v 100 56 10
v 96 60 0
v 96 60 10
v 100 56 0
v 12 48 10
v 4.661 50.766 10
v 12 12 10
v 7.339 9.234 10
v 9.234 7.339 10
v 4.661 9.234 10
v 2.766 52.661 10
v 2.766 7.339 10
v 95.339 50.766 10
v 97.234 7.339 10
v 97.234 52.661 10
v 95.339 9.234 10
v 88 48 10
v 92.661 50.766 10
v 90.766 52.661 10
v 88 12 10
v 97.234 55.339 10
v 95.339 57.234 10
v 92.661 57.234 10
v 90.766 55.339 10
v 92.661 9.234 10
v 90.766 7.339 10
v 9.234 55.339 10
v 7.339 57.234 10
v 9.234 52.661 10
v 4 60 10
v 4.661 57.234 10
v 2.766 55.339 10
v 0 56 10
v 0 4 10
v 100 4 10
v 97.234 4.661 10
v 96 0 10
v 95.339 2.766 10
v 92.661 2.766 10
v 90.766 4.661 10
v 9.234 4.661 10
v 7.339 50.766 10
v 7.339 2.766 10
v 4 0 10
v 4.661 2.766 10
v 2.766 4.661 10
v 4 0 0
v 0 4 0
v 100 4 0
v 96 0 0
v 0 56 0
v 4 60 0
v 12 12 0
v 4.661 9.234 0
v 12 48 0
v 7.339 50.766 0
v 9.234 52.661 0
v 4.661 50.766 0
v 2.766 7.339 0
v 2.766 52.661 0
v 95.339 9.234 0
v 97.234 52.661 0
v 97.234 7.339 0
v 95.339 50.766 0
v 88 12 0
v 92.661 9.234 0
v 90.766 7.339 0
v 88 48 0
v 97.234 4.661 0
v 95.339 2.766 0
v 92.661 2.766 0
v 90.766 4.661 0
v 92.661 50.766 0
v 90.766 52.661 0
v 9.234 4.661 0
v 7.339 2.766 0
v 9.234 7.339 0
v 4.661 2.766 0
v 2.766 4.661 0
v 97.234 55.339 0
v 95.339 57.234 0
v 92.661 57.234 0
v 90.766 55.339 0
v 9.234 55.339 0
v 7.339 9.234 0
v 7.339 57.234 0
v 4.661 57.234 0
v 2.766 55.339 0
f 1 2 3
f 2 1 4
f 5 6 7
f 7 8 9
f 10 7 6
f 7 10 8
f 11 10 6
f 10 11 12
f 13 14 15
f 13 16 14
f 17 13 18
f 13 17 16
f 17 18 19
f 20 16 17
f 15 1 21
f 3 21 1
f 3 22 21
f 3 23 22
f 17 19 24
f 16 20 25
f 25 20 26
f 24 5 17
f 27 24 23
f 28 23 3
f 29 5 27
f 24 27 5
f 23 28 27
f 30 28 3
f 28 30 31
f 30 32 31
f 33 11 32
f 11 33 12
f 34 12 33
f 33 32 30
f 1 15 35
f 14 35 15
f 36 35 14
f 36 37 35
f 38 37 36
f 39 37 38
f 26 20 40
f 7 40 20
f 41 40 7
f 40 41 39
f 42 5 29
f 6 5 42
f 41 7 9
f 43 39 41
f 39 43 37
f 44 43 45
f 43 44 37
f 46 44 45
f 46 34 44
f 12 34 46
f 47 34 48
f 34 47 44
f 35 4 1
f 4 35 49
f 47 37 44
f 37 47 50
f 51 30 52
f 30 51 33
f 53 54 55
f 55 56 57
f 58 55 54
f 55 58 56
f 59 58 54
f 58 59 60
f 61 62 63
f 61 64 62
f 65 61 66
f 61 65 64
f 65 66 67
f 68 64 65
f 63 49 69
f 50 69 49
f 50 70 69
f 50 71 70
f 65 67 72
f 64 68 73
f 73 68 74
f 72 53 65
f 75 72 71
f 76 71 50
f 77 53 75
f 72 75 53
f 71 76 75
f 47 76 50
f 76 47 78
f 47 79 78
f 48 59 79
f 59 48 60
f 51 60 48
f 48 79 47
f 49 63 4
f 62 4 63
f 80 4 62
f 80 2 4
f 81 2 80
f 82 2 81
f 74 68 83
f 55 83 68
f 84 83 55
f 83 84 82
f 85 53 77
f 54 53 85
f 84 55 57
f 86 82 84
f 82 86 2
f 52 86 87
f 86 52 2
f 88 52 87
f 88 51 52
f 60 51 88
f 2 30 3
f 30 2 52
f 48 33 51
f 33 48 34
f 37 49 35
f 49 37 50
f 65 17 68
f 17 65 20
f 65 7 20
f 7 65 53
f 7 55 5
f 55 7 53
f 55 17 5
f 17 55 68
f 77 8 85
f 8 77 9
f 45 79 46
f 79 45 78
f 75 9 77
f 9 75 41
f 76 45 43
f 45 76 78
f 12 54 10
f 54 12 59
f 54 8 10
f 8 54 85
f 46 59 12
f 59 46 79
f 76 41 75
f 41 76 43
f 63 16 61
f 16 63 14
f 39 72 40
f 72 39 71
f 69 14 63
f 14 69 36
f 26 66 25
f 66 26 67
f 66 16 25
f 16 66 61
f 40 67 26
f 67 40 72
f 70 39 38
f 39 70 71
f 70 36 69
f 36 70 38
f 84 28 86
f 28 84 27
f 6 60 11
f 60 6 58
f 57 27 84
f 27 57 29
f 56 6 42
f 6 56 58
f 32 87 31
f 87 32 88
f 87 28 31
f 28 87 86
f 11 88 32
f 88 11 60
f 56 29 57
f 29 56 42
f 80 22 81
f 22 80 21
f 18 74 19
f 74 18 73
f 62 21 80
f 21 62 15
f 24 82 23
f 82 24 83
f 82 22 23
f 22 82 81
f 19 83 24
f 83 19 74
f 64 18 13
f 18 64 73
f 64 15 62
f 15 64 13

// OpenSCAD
$fn = 32;

// ----------------------------------------------------------------------
// Frame plate: 100 x 60 frame, 12 mm rails
// ----------------------------------------------------------------------

// --- parameters (mm) ---
plate_l = 100;            // plate length, X
plate_w = 60;             // plate width, Y
plate_t = 10;             // plate thickness, Z (extrusion height)
corner_c = 4;             // corner chamfer
frame_bar = 12;           // frame rail width
bolt_r = 3.5;             // corner bolt window radius
bolt_inset = 6;           // bolt centre inset from the edges

win_l = plate_l - 2 * frame_bar;  // window length
win_w = plate_w - 2 * frame_bar;  // window width
bolt_d = 2 * bolt_r;  // corner hole diameter

profile = [[4, 0], [96, 0], [100, 4], [100, 56], [96, 60], [4, 60], [0, 56], [0, 4]];  // primary outline, 8 points, counter clockwise
void_1 = [[12, 12], [88, 12], [88, 48], [12, 48]];  // the window, 4 points
void_2 = [[9.234, 7.339], [7.339, 9.234], [4.661, 9.234], [2.766, 7.339], [2.766, 4.661], [4.661, 2.766], [7.339, 2.766], [9.234, 4.661]];  // corner bolt window, 8 points
void_3 = [[97.234, 7.339], [95.339, 9.234], [92.661, 9.234], [90.766, 7.339], [90.766, 4.661], [92.661, 2.766], [95.339, 2.766], [97.234, 4.661]];  // corner bolt window, 8 points
void_4 = [[9.234, 55.339], [7.339, 57.234], [4.661, 57.234], [2.766, 55.339], [2.766, 52.661], [4.661, 50.766], [7.339, 50.766], [9.234, 52.661]];  // corner bolt window, 8 points
void_5 = [[97.234, 55.339], [95.339, 57.234], [92.661, 57.234], [90.766, 55.339], [90.766, 52.661], [92.661, 50.766], [95.339, 50.766], [97.234, 52.661]];  // corner bolt window, 8 points

// --- the one profile operation ---
difference() {
  linear_extrude(height = plate_t) polygon(points = profile);
  translate([0, 0, -1])
    linear_extrude(height = plate_t + 2) polygon(points = void_1);
  translate([0, 0, -1])
    linear_extrude(height = plate_t + 2) polygon(points = void_2);
  translate([0, 0, -1])
    linear_extrude(height = plate_t + 2) polygon(points = void_3);
  translate([0, 0, -1])
    linear_extrude(height = plate_t + 2) polygon(points = void_4);
  translate([0, 0, -1])
    linear_extrude(height = plate_t + 2) polygon(points = void_5);
}
